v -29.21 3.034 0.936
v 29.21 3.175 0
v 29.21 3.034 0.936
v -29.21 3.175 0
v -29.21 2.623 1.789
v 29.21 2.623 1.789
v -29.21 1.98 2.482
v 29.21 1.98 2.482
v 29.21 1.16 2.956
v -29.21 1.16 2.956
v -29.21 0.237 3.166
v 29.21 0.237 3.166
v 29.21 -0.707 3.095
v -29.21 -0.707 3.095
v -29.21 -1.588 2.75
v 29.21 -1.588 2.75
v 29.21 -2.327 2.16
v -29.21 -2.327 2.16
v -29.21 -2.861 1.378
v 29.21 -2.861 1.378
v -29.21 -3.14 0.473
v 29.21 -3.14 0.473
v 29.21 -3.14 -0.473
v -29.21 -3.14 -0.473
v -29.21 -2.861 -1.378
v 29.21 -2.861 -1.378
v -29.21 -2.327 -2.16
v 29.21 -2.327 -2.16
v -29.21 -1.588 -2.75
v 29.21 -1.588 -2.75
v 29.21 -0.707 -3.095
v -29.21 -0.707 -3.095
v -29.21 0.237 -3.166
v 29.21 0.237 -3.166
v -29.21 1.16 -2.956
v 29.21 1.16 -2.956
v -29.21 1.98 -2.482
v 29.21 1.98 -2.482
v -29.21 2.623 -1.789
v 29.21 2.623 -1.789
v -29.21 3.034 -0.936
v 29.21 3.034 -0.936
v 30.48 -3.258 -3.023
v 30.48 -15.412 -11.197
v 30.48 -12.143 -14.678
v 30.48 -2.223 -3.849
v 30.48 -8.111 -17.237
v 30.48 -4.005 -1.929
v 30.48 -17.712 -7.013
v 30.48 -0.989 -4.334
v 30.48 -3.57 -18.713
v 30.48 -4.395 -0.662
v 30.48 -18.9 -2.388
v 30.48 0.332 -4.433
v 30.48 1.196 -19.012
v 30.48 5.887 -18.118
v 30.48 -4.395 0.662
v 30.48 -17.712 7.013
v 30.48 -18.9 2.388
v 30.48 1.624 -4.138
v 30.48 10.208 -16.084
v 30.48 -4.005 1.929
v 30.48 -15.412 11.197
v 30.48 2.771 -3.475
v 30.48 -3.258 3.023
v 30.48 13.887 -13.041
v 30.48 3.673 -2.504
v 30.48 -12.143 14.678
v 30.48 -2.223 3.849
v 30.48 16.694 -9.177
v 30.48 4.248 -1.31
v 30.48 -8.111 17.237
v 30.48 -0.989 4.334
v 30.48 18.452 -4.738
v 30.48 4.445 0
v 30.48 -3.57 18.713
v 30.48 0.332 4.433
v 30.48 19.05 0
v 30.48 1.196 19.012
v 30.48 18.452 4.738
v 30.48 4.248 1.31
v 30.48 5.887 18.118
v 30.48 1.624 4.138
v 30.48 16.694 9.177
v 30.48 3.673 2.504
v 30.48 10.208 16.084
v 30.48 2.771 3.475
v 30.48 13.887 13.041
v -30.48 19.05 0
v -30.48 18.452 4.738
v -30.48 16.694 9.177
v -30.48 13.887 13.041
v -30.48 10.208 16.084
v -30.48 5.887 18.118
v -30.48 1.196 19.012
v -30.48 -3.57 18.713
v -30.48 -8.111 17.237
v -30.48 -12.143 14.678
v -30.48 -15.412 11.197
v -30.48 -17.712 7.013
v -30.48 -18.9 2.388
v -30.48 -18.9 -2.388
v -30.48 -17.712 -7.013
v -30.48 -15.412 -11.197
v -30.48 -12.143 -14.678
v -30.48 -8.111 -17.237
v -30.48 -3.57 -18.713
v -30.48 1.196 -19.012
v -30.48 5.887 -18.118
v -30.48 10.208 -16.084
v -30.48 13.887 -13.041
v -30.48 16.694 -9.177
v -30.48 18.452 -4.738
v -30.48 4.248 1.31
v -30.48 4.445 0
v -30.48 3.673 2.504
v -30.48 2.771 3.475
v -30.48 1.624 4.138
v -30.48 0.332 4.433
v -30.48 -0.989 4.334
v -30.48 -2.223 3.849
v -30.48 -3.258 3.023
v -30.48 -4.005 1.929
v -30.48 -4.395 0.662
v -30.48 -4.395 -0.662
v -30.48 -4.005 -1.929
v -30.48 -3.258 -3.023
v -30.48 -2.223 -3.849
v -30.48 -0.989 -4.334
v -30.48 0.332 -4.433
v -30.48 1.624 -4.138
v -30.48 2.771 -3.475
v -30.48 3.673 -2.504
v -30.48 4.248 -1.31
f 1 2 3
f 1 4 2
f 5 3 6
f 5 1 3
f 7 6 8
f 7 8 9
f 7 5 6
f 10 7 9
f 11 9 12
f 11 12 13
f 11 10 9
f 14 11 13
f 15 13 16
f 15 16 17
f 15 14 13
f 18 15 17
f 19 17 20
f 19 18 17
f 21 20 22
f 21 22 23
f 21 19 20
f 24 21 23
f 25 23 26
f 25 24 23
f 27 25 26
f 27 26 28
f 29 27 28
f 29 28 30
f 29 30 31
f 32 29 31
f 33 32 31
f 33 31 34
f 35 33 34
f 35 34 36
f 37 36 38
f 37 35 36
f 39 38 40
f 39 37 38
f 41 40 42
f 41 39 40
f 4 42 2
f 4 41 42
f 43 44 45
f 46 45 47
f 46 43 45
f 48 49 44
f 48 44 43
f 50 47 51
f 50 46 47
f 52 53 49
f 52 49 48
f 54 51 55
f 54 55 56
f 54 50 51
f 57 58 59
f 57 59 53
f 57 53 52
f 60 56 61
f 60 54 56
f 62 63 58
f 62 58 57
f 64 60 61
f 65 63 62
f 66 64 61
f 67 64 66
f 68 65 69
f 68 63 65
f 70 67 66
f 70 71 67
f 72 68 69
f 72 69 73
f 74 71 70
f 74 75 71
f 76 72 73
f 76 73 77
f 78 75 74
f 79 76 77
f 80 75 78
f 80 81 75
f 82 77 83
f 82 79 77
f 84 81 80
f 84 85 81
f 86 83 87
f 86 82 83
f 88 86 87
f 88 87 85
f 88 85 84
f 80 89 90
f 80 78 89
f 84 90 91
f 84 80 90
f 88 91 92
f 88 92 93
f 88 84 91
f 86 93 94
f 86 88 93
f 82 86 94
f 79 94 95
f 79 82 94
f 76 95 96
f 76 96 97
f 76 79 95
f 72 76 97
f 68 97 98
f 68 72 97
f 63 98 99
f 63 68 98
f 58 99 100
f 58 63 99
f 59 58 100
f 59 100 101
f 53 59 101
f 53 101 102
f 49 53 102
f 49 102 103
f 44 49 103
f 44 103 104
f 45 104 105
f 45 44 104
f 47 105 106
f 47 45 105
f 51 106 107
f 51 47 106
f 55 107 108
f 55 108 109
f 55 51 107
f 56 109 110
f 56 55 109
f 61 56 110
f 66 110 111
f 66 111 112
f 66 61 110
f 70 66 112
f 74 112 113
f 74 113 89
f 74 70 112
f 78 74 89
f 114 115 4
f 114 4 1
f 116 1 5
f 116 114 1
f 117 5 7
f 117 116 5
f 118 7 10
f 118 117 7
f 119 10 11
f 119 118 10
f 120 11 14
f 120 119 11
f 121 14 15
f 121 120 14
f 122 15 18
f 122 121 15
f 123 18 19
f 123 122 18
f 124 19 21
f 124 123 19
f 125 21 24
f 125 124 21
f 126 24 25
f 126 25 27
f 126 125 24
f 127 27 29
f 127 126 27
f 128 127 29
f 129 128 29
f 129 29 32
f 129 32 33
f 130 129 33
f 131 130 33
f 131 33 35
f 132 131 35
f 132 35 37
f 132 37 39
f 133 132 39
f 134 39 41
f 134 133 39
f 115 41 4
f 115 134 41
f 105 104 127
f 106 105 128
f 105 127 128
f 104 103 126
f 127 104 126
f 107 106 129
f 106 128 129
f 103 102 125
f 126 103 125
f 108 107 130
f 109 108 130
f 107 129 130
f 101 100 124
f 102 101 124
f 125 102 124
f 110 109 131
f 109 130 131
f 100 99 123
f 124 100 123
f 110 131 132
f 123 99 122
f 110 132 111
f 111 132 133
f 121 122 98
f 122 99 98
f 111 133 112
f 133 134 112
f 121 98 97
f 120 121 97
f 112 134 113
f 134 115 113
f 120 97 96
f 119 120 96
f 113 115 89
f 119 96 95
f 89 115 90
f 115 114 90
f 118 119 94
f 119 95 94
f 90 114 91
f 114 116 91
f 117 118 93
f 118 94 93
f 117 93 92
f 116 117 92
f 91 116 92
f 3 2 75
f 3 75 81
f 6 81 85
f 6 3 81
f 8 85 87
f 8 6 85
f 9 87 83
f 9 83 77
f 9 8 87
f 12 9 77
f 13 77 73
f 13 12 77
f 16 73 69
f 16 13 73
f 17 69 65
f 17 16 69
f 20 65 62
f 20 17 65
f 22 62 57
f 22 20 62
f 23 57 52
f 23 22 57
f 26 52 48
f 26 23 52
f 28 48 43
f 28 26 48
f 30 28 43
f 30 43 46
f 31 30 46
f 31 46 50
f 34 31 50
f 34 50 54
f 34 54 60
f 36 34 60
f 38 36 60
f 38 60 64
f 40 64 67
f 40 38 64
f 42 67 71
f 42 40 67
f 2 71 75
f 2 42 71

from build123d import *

# Parameters (mm, degrees)
F0_R     = 19.05
F0_R_2   = 3.175
F1_DEPTH = 30.48
F3_SIZE  = 1.27


with BuildPart() as f1:
    # F0 (on Right) → F1 (new body)
    with BuildSketch(Plane.YZ):
        Circle(F0_R)
        Circle(F0_R_2, mode=Mode.SUBTRACT)
    extrude(amount=F1_DEPTH)

    # F2: F1 across face


with BuildPart() as f1_1:
    add(f1.part)
    add(f1.part.mirror(Plane(origin=(0, 0, 0), x_dir=(0, 1, 0), z_dir=(-1, 0, 0))))

    # F3
    f3_edges = [f1_1.edges().sort_by_distance(p)[0] for p in [
        (30.48, -3.175, 0),
        (-30.48, -3.175, 0),
    ]]
    chamfer(f3_edges, length=F3_SIZE)


solid = f1_1.part
